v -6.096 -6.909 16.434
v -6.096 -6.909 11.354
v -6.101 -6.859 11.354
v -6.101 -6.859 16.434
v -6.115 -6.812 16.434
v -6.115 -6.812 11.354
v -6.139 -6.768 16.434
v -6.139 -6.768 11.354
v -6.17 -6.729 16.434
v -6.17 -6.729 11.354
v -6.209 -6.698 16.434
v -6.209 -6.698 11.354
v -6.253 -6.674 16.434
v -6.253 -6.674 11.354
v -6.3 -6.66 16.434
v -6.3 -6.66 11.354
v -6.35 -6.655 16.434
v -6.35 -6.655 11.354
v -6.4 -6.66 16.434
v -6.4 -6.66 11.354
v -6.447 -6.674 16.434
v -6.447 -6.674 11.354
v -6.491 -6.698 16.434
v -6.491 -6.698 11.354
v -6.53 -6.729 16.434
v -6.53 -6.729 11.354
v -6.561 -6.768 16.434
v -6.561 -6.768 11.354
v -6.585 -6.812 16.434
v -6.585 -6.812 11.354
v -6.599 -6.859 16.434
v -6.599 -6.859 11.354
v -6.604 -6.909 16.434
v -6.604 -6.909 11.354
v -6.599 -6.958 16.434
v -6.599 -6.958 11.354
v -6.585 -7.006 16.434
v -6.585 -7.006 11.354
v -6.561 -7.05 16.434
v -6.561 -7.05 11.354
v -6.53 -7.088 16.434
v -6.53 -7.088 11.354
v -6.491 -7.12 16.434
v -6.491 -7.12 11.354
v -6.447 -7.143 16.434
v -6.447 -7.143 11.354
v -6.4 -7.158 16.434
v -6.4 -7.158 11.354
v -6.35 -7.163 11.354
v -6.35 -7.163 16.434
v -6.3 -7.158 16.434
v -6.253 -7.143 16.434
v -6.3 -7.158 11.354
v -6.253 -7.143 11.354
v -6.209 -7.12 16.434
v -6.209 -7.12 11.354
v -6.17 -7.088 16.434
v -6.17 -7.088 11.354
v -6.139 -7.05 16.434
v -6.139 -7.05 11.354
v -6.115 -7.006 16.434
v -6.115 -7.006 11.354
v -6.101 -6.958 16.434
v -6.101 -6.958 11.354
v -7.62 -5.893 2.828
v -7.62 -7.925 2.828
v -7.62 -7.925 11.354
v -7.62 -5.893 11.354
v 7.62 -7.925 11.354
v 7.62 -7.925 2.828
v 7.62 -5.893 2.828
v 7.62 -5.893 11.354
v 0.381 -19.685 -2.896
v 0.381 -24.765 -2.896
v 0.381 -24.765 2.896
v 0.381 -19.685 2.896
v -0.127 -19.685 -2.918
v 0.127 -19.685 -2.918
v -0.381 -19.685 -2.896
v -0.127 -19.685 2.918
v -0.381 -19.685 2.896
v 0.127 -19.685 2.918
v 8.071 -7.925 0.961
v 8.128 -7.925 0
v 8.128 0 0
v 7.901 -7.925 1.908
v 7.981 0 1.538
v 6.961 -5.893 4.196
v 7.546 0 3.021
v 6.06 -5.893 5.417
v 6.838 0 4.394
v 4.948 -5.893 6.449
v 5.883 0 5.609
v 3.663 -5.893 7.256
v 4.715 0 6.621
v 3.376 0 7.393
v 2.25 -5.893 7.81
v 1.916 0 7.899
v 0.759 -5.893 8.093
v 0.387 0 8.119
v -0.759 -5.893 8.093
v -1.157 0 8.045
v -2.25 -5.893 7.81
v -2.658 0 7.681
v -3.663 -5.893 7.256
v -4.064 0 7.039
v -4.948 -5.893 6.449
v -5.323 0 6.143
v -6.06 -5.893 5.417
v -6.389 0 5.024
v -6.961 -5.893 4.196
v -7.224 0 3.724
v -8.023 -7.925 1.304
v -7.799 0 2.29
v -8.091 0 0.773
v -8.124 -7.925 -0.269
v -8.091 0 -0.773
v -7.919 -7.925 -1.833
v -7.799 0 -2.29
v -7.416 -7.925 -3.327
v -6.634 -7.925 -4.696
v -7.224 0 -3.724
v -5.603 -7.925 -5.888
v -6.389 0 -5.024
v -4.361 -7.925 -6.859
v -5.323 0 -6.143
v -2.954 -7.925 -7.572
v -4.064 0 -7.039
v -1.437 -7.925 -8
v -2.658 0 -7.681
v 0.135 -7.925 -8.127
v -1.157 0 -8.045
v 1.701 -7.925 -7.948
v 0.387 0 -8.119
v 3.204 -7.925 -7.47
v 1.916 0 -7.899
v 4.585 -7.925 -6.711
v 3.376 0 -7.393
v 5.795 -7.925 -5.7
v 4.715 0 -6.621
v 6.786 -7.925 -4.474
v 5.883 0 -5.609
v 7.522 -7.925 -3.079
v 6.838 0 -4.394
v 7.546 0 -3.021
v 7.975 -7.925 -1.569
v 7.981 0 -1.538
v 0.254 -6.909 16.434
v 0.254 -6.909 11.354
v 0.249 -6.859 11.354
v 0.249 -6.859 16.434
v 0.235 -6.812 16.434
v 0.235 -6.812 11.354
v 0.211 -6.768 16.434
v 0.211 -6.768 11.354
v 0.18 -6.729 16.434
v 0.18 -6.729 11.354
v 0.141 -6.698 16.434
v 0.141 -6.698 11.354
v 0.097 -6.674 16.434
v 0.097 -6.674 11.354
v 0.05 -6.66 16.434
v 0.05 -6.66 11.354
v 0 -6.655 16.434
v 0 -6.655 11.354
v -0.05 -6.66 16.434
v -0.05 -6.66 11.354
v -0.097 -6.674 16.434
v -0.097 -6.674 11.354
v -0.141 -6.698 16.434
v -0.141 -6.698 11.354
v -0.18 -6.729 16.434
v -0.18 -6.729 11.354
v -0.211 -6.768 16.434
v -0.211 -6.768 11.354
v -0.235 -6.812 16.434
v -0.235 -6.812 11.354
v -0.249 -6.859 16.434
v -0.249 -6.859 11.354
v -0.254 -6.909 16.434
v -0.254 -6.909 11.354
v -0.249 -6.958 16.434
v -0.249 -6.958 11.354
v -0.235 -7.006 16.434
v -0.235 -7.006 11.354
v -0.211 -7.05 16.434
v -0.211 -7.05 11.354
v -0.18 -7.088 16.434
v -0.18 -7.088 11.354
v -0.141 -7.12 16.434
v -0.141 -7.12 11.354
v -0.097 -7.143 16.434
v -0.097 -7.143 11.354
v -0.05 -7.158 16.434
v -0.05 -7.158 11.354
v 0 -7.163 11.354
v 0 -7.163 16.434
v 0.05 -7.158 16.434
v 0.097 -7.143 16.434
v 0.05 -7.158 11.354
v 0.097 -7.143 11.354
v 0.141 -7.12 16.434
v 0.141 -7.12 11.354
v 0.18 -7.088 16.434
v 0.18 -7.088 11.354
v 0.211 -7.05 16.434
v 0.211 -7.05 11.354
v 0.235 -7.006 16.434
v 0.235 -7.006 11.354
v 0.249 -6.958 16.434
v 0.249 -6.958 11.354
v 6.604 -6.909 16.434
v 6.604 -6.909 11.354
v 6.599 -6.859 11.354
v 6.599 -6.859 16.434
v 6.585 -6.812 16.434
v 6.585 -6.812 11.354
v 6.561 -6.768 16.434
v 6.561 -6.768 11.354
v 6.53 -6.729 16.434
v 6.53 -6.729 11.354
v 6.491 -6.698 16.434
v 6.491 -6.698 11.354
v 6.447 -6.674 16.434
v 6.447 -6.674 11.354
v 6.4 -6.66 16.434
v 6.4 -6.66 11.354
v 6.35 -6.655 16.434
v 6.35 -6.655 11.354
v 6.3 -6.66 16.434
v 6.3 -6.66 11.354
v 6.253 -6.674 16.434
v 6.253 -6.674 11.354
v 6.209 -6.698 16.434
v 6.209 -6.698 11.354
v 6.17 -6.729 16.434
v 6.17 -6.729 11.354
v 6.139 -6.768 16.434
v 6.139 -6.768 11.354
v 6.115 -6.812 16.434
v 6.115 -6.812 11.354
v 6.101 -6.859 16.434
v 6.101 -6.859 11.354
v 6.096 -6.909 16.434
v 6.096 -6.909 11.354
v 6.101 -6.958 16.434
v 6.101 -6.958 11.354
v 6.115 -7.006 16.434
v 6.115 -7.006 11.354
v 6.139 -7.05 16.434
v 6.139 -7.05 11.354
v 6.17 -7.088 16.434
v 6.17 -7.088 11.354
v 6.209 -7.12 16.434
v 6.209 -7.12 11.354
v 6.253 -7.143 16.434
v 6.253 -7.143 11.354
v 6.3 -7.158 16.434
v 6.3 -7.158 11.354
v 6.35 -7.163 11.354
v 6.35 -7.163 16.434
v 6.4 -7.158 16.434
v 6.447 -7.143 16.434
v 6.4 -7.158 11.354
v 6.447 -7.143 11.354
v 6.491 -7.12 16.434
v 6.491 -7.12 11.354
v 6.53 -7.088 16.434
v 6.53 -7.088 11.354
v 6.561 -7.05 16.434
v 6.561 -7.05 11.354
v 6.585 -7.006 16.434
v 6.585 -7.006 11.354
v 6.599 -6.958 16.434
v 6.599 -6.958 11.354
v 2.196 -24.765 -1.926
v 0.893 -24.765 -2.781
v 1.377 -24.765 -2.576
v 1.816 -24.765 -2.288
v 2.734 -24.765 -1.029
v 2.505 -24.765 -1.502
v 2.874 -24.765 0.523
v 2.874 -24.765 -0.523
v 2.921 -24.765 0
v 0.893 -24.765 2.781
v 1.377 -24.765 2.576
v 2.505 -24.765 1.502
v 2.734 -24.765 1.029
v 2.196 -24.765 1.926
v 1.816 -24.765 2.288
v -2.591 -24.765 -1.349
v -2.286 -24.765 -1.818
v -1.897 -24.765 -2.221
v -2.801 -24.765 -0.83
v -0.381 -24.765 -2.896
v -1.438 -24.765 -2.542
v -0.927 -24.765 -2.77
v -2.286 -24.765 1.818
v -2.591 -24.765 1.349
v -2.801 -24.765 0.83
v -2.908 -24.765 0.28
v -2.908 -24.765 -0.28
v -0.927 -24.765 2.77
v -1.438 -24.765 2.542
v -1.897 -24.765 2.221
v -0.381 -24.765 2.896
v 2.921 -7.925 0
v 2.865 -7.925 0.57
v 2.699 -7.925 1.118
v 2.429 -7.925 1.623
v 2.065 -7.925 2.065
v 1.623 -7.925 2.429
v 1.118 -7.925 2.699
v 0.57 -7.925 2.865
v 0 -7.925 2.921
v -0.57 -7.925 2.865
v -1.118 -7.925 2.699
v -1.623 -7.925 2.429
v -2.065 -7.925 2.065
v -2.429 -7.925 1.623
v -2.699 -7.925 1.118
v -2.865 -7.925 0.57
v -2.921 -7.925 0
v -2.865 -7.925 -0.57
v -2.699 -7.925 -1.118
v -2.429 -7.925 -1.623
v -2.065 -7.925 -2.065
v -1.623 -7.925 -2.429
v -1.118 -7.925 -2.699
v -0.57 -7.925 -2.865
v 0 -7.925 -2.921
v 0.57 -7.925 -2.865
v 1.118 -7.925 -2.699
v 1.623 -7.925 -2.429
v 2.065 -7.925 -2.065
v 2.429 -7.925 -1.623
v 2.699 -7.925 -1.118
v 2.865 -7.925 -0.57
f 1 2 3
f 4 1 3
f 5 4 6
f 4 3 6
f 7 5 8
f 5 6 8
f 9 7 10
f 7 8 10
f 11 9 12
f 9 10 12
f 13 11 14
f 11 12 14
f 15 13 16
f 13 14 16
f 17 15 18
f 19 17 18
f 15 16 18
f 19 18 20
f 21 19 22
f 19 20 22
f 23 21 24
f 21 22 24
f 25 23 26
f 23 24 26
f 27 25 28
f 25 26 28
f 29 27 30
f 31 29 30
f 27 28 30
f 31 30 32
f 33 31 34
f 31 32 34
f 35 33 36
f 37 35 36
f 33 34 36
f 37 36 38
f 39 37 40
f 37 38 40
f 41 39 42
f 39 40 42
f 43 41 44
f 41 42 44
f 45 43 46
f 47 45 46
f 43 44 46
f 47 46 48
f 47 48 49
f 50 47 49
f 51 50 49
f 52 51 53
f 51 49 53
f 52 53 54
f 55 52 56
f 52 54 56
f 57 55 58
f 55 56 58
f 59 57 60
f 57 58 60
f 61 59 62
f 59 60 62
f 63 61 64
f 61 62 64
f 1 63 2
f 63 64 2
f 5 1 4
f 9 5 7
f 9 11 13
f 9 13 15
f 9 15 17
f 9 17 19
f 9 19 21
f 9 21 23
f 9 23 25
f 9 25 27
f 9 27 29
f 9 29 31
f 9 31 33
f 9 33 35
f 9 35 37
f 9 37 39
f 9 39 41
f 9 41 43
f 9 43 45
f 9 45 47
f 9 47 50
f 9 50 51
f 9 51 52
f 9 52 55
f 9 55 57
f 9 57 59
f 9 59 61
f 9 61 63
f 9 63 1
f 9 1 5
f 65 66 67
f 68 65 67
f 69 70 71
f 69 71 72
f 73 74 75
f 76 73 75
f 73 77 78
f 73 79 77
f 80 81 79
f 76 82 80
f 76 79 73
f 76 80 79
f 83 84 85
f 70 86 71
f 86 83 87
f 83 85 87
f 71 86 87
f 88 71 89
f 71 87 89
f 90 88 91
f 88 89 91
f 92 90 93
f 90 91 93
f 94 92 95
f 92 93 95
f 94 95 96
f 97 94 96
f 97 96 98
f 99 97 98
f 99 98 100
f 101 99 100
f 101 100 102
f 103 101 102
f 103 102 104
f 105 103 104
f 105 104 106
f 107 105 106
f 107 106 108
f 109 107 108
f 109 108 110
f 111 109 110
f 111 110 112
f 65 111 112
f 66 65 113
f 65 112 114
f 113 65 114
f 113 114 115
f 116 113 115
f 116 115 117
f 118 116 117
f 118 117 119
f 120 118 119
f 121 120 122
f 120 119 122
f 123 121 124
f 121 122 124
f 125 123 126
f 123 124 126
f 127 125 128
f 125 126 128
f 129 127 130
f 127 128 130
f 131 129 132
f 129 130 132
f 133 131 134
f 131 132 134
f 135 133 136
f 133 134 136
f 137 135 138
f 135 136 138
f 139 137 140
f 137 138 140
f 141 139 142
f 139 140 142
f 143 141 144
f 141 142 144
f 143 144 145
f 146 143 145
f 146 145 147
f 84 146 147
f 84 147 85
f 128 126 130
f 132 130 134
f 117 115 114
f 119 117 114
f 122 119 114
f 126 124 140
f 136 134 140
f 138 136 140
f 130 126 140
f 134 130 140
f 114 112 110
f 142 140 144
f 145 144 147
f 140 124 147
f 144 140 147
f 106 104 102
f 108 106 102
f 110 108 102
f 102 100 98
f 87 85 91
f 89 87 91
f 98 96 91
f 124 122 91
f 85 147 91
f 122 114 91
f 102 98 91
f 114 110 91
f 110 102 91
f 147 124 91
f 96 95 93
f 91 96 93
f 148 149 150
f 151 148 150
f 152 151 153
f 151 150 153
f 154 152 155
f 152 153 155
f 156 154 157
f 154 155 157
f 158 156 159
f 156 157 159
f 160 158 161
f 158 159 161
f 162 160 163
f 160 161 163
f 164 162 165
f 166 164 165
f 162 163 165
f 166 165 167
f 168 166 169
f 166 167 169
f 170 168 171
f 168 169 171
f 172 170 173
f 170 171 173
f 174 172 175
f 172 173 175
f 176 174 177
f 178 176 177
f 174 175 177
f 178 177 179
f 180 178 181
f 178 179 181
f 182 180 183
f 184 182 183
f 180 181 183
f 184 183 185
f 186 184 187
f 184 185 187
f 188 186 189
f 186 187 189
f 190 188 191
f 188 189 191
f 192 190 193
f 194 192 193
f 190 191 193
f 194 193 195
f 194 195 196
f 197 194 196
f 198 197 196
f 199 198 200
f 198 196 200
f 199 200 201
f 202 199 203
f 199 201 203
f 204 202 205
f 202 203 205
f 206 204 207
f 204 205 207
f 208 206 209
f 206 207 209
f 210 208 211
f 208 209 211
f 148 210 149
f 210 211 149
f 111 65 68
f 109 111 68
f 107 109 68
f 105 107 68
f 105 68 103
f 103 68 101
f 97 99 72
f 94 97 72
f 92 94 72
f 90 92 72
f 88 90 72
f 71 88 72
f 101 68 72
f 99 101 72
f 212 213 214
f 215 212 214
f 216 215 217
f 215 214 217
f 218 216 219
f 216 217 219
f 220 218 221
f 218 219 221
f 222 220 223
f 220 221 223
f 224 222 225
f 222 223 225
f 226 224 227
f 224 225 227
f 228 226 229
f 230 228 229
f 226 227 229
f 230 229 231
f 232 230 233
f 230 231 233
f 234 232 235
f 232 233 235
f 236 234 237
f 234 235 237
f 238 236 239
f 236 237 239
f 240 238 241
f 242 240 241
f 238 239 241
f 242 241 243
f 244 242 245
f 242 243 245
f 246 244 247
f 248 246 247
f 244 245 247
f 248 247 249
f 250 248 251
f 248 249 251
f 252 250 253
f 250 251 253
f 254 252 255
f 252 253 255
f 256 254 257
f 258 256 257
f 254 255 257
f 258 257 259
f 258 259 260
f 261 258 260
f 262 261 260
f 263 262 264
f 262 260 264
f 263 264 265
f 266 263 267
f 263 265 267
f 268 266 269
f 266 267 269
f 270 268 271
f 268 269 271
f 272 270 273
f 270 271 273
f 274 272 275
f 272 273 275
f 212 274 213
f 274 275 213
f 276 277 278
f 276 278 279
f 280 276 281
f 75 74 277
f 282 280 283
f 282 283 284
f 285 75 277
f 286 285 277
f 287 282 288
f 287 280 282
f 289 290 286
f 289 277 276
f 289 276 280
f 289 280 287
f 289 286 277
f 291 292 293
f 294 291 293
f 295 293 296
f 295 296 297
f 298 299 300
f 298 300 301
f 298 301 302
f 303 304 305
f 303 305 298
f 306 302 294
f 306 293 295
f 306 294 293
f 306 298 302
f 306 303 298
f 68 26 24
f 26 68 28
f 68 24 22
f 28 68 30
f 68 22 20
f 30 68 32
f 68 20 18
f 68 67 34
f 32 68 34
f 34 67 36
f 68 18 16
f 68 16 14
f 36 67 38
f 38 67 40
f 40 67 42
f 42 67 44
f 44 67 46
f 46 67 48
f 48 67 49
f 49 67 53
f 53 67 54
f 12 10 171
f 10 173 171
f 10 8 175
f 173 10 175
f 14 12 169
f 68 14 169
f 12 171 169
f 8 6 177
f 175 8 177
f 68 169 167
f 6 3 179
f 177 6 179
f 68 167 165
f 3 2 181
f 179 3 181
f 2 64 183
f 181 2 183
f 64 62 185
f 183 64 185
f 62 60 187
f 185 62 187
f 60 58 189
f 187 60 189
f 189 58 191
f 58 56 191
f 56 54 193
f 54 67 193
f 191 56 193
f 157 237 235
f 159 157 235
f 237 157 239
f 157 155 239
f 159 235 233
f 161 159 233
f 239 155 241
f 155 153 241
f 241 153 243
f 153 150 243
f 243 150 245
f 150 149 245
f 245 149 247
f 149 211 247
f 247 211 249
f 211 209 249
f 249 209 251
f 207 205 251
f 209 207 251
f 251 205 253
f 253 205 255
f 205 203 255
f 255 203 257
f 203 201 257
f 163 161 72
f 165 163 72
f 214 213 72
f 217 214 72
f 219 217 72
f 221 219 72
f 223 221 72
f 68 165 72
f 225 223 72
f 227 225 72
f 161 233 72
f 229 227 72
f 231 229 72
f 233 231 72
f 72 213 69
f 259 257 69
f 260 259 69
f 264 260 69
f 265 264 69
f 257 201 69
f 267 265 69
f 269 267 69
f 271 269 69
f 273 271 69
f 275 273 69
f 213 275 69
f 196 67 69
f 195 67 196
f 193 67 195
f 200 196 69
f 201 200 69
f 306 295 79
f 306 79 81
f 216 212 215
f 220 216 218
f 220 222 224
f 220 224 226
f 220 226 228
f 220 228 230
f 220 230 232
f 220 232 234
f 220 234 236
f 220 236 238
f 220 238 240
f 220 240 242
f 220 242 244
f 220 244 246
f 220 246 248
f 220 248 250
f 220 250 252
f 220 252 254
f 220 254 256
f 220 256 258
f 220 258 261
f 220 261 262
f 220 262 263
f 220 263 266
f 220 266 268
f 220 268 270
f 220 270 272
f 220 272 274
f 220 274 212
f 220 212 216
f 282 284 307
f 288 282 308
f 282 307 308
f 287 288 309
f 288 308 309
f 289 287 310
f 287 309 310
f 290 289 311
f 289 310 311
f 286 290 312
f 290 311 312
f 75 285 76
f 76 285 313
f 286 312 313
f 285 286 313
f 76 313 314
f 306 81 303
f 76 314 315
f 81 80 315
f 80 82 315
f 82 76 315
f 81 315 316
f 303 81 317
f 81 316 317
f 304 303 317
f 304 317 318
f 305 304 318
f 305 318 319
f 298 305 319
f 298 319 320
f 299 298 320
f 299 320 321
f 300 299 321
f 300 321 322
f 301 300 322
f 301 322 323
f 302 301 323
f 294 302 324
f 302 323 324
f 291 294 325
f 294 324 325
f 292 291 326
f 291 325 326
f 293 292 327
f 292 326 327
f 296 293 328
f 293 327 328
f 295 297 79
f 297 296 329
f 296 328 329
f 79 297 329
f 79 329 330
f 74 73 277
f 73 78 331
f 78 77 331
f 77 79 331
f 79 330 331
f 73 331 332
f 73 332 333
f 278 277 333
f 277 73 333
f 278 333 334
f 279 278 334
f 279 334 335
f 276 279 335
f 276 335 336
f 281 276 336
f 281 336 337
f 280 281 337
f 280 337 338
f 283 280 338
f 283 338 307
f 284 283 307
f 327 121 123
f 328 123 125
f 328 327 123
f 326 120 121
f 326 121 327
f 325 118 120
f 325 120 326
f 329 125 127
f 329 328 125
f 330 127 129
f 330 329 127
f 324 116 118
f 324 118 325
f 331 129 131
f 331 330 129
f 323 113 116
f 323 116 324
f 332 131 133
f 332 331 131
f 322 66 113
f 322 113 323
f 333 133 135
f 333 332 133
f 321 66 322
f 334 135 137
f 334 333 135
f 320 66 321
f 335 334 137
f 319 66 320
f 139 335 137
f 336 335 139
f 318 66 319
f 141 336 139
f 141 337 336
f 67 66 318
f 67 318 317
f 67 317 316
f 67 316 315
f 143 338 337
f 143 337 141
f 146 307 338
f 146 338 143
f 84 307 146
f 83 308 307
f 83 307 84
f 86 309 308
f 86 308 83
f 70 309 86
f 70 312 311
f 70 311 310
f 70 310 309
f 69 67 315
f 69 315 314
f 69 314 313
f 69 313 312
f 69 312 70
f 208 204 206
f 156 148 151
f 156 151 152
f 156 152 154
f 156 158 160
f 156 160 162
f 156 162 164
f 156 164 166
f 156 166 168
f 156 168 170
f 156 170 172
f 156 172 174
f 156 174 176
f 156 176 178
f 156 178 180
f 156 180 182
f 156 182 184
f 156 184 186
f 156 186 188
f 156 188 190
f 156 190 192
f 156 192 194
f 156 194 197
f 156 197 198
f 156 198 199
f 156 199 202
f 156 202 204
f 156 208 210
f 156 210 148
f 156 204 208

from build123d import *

# Parameters (mm, degrees)
F0_R     = 8.128
F1_DEPTH = 7.9248
F2_R     = 2.921
F3_DEPTH = 16.8402
F4_W     = 15.24
F4_H     = 10.8462307572
F5_DEPTH = 2.032
F6_R     = 0.254
F7_DEPTH = 5.08
F8_W     = 0.762
F8_H     = 6.35
F9_DEPTH = 5.08


with BuildPart() as f1:
    # F0 (on Front) → F1 (new body)
    with BuildSketch(Plane.XZ):
        Circle(F0_R)
    extrude(amount=F1_DEPTH)

    # F2 (on face) → F3 (join)
    with BuildSketch(Plane.XZ.offset(7.9248)):
        Circle(F2_R)
    extrude(amount=F3_DEPTH)

    # F4 (on face) → F5 (join)
    with BuildSketch(Plane.XZ.offset(7.9248)):
        with Locations((0, 5.9306846214)):
            Rectangle(F4_W, F4_H)
    extrude(amount=-F5_DEPTH)

    # F6 (on face) → F7 (join)
    with BuildSketch(Plane.XY.offset(11.3538)):
        with Locations((0, -6.9088)):
            Circle(F6_R)
        with Locations((6.35, -6.9088)):
            Circle(F6_R)
        with Locations((-6.35, -6.9088)):
            Circle(F6_R)
    extrude(amount=F7_DEPTH)

    # F8 (on face) → F9 (cut)
    with BuildSketch(Plane.XZ.offset(24.765)):
        Rectangle(F8_W, F8_H)
    extrude(amount=-F9_DEPTH, mode=Mode.SUBTRACT)


solid = f1.part
